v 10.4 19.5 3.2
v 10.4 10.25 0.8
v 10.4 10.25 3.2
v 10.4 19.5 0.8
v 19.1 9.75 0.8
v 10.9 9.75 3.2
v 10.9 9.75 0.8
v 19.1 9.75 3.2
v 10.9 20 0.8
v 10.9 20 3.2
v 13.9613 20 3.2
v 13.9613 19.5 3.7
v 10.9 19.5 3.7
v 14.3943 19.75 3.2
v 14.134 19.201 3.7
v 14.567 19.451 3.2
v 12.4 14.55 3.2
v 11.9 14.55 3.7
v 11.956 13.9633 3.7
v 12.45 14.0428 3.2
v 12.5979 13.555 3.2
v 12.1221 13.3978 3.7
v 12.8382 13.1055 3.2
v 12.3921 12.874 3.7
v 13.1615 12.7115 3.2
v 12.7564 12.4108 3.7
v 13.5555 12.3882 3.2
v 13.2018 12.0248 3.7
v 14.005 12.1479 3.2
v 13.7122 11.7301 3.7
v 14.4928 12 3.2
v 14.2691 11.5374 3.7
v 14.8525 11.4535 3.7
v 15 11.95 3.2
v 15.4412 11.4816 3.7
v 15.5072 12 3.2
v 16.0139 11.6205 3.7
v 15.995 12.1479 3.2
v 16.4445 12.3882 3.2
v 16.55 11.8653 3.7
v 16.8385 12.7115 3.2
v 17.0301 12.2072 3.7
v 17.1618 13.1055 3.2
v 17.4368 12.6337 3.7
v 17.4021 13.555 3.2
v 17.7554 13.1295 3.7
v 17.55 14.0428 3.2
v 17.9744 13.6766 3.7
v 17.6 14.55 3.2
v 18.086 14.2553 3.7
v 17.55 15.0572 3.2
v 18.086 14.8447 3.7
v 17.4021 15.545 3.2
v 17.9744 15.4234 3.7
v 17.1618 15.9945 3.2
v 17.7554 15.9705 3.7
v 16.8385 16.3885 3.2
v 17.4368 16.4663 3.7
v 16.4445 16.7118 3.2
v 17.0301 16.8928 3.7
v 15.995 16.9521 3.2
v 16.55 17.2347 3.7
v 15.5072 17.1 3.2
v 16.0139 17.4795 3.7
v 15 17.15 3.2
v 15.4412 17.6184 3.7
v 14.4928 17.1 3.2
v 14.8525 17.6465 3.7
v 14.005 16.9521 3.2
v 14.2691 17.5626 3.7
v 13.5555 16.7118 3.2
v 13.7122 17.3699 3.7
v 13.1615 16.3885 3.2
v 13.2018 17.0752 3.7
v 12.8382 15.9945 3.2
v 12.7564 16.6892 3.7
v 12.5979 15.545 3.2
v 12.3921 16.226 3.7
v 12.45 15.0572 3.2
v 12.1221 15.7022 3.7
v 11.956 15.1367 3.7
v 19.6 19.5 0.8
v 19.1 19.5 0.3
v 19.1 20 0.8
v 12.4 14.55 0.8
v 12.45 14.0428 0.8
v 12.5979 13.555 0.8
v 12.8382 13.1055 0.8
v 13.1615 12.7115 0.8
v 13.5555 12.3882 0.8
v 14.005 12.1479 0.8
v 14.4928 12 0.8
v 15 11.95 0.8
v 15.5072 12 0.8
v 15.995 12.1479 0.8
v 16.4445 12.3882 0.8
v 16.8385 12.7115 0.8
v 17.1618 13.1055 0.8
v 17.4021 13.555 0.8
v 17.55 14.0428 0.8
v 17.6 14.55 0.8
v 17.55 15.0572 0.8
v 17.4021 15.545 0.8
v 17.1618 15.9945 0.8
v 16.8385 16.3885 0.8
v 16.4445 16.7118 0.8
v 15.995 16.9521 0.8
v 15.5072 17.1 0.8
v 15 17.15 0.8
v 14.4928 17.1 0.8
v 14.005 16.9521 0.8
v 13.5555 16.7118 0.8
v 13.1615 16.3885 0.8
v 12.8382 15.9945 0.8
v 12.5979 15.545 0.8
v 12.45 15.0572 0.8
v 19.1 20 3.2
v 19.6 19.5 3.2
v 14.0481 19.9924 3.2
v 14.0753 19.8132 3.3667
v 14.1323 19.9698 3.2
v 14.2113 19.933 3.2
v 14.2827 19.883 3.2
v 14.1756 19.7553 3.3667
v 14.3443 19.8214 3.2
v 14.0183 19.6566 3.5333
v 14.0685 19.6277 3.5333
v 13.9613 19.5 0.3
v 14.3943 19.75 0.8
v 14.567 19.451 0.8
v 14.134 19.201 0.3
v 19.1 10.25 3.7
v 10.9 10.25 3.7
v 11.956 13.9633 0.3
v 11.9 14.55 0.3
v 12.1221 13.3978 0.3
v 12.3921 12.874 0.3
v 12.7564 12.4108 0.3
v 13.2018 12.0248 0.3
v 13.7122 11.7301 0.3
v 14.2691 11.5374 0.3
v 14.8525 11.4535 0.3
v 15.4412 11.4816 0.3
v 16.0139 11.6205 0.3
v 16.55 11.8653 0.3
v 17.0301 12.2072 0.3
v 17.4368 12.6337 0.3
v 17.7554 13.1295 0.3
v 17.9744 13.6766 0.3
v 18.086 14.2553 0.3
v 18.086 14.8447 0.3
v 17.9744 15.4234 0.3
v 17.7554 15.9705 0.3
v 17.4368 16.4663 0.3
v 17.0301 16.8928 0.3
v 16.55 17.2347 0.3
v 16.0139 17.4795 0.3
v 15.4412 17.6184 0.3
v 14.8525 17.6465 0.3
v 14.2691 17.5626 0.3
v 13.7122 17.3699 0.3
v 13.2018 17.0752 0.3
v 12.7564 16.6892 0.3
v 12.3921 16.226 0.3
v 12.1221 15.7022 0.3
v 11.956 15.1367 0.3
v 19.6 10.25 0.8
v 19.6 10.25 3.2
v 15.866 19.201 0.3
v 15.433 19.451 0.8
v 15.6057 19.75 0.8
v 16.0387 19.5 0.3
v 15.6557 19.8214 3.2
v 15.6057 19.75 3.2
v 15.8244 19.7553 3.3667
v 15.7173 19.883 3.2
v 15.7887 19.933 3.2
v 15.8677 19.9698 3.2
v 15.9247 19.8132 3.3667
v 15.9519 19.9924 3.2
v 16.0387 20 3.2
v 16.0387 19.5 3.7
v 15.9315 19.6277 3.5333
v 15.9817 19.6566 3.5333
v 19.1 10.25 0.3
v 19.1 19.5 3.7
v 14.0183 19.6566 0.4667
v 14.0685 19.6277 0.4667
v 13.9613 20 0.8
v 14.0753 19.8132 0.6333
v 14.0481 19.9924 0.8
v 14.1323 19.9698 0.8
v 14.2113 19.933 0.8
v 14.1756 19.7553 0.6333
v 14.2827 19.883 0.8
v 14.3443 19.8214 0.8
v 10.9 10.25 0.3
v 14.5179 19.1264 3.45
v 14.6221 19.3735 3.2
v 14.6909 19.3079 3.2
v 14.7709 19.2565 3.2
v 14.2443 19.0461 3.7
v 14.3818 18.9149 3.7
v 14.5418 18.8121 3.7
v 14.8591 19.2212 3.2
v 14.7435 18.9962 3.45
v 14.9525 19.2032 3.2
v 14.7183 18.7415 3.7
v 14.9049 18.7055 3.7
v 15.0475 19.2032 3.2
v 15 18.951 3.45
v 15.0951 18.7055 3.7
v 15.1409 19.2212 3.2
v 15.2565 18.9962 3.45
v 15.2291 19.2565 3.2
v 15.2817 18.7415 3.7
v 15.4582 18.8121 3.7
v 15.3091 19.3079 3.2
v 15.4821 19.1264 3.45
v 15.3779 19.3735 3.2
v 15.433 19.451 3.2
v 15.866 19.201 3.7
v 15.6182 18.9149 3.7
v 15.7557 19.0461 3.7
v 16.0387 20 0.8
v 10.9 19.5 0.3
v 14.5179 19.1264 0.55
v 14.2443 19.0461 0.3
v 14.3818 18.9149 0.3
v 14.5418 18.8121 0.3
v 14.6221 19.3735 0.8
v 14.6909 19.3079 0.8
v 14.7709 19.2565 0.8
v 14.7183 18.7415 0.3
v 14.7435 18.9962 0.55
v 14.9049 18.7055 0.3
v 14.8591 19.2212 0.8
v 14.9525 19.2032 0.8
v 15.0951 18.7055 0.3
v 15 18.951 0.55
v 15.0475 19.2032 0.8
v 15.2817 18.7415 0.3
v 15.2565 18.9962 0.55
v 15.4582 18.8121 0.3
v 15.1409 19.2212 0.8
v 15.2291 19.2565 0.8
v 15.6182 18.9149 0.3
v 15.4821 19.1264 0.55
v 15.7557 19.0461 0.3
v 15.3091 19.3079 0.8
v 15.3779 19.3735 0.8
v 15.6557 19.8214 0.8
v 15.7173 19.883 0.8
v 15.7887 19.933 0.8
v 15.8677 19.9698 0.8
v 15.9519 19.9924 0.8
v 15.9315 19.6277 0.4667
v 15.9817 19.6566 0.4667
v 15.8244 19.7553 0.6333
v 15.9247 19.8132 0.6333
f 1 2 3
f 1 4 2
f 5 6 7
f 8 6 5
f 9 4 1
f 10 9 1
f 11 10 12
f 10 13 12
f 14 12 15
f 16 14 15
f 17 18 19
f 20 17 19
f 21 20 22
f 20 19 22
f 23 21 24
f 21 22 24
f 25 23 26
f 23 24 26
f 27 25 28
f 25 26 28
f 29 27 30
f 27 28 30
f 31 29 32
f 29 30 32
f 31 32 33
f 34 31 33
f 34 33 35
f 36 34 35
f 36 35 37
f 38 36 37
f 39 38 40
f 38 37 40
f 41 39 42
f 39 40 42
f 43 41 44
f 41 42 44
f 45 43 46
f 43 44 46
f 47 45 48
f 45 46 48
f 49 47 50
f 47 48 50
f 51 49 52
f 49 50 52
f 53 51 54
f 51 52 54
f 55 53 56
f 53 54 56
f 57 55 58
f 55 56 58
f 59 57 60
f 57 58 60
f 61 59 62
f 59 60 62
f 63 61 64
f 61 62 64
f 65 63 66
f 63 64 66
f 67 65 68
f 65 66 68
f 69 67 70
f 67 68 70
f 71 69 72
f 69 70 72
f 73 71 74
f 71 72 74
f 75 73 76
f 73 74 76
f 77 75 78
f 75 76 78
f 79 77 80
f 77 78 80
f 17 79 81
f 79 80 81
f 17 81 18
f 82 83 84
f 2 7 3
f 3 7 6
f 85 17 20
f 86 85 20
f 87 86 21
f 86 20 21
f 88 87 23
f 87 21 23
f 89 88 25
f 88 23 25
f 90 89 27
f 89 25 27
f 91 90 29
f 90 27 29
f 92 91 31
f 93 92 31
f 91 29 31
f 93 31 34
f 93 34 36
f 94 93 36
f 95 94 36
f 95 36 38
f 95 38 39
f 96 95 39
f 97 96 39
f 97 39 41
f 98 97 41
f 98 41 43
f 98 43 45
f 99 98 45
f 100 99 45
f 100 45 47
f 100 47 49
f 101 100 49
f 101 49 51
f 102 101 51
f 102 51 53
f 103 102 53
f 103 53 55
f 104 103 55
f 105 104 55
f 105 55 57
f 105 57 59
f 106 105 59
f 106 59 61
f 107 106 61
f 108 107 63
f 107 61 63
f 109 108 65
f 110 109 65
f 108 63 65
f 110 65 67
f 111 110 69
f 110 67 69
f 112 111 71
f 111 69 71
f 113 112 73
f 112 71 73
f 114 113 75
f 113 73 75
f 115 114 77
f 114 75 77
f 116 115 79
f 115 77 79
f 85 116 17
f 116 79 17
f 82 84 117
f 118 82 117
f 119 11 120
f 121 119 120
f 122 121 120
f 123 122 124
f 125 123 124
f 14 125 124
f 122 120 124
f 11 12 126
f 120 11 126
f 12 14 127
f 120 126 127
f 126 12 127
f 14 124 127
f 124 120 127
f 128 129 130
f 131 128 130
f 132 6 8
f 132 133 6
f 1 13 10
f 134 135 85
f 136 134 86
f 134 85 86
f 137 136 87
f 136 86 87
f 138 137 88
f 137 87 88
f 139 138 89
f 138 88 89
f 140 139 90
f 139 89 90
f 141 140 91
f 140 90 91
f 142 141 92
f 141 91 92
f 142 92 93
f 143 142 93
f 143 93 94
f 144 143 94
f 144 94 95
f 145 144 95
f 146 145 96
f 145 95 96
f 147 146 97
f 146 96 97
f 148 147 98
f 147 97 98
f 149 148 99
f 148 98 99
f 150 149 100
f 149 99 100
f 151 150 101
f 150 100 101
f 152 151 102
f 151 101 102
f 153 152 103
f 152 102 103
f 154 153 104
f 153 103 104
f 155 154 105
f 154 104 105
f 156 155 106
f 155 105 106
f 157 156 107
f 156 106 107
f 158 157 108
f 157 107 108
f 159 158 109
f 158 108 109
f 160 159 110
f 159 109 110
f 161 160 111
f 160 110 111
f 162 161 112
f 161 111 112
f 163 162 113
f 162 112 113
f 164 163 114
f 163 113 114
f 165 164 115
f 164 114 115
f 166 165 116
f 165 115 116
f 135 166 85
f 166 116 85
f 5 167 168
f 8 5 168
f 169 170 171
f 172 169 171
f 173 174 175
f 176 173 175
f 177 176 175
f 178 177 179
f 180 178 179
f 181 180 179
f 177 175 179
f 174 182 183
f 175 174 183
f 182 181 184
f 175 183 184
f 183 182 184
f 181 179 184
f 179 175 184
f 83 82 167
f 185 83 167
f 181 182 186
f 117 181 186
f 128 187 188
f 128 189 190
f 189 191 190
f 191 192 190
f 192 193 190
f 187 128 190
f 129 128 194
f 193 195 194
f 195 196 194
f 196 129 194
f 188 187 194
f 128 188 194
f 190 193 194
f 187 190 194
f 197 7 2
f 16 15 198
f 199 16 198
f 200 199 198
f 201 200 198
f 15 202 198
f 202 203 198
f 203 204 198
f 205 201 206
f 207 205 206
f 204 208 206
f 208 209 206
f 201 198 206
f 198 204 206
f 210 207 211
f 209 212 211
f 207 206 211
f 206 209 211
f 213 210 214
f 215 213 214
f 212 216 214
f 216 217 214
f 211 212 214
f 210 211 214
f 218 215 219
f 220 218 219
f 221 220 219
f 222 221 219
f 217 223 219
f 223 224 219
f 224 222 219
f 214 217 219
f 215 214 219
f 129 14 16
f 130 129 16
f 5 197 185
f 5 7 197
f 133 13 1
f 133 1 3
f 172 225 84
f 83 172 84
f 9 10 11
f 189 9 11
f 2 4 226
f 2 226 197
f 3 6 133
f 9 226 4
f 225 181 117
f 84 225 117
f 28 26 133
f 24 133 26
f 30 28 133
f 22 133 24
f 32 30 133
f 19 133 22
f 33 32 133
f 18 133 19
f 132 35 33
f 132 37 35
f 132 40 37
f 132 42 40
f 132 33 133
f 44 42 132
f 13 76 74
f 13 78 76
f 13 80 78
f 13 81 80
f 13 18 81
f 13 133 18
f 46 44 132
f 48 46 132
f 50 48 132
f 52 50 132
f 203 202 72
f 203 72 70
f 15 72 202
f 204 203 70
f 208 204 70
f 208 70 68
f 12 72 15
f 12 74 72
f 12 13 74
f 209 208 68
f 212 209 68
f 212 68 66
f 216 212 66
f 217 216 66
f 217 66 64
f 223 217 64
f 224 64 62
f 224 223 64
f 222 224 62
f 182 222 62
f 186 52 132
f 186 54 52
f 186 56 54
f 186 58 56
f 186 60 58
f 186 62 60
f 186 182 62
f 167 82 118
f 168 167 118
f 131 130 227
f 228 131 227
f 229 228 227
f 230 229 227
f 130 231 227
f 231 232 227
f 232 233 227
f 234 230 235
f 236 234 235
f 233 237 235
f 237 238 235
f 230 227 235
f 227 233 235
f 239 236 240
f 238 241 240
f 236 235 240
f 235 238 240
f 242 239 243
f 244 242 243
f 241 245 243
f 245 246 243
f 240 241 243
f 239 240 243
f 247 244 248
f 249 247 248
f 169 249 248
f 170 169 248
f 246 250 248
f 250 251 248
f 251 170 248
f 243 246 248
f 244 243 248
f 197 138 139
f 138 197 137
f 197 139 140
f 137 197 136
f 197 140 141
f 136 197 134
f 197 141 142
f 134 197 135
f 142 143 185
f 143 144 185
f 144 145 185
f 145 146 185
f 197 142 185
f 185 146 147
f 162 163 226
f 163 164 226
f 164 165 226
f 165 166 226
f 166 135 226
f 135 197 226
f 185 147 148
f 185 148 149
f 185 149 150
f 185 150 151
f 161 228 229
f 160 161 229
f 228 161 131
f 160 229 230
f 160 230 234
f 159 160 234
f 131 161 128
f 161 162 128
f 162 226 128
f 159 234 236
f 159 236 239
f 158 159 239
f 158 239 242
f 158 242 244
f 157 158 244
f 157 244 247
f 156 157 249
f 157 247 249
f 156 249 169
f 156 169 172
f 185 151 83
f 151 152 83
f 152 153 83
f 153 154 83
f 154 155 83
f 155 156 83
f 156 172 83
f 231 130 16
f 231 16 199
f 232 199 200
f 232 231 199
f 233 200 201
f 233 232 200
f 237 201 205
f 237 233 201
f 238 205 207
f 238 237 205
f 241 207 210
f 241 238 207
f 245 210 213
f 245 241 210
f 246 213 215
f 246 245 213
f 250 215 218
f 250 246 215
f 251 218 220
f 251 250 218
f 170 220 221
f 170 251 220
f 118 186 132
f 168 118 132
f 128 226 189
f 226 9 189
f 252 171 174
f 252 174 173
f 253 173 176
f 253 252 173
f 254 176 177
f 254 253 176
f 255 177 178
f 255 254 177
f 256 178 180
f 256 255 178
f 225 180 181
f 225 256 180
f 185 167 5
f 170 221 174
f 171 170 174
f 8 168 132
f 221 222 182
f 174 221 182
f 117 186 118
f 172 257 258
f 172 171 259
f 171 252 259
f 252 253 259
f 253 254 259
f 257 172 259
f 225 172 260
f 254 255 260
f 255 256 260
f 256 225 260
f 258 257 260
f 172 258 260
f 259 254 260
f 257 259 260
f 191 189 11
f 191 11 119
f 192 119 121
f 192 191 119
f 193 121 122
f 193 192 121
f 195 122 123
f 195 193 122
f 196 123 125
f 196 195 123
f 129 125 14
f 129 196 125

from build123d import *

# Parameters (mm, degrees)
SKETCH101_W     = 9.2
SKETCH101_H     = 3.4
PAD021_DEPTH    = 10.25
SKETCH098_R     = 0.5
POCKET040_DEPTH = 3.401
SKETCH100_R     = 2.6
POCKET041_DEPTH = 3.401
POCKET042_DEPTH = 3.401
FILLET001_R     = 0.5
CHAMFER040_SIZE = 0.5


with BuildPart() as part:
    # Sketch101 → Pad021 (new body)
    with BuildSketch(Plane.XZ):
        Rectangle(SKETCH101_W, SKETCH101_H)
    extrude(amount=PAD021_DEPTH)

    # Sketch098 (on Face1 of Pad021) → Pocket040 (cut, through all)
    with BuildSketch(Plane(origin=(0, 0, -1.7), x_dir=(1, 0, 0), z_dir=(0, 0, -1))):
        with Locations((0, 5.45)):
            Circle(SKETCH098_R)
    extrude(amount=-POCKET040_DEPTH, mode=Mode.SUBTRACT)

    # Sketch100 (on Face7 of Pocket040) → Pocket041 (cut, through all)
    with BuildSketch(Plane(origin=(0, 0, 1.7), x_dir=(-1, 0, 0), z_dir=(0, 0, 1))):
        with Locations((0, 5.45)):
            Circle(SKETCH100_R)
    extrude(amount=-POCKET041_DEPTH, mode=Mode.SUBTRACT)

    # Sketch103 → Pocket042 (cut, through all)
    with BuildSketch(Plane(origin=(0, 0, 1.7), x_dir=(-1, 0, 0), z_dir=(0, 0, 1))):
        Polygon((0.75, 0), (0, 1.299038), (-0.75, 0), align=None)
    extrude(amount=-POCKET042_DEPTH, mode=Mode.SUBTRACT)

    # Fillet001
    fillet001_edges = [part.edges().sort_by_distance(p)[0] for p in [
        (0.75, 0, 0),
        (0, -1.299038, 0),
        (-0.75, 0, 0),
    ]]
    fillet(fillet001_edges, radius=FILLET001_R)

    # Chamfer040
    chamfer040_edges = [part.edges().sort_by_distance(p)[0] for p in [
        (2.819338, 0, 1.7),
        (2.819338, 0, -1.7),
        (4.6, -5.125, -1.7),
        (4.6, -5.125, 1.7),
        (4.6, 0, 0),
        (4.6, -10.25, 0),
        (0, -10.25, -1.7),
        (0, -10.25, 1.7),
        (-4.6, -10.25, 0),
        (-4.6, -5.125, 1.7),
        (-4.6, -5.125, -1.7),
        (-4.6, 0, 0),
        (2.6, -5.45, 1.7),
        (2.6, -5.45, -1.7),
    ]]
    chamfer(chamfer040_edges, length=CHAMFER040_SIZE)


with BuildPart() as part_1:
    # Body020 placement: moved
    add(part.part.moved(Location((15, 20, 2))))


solid = part_1.part
